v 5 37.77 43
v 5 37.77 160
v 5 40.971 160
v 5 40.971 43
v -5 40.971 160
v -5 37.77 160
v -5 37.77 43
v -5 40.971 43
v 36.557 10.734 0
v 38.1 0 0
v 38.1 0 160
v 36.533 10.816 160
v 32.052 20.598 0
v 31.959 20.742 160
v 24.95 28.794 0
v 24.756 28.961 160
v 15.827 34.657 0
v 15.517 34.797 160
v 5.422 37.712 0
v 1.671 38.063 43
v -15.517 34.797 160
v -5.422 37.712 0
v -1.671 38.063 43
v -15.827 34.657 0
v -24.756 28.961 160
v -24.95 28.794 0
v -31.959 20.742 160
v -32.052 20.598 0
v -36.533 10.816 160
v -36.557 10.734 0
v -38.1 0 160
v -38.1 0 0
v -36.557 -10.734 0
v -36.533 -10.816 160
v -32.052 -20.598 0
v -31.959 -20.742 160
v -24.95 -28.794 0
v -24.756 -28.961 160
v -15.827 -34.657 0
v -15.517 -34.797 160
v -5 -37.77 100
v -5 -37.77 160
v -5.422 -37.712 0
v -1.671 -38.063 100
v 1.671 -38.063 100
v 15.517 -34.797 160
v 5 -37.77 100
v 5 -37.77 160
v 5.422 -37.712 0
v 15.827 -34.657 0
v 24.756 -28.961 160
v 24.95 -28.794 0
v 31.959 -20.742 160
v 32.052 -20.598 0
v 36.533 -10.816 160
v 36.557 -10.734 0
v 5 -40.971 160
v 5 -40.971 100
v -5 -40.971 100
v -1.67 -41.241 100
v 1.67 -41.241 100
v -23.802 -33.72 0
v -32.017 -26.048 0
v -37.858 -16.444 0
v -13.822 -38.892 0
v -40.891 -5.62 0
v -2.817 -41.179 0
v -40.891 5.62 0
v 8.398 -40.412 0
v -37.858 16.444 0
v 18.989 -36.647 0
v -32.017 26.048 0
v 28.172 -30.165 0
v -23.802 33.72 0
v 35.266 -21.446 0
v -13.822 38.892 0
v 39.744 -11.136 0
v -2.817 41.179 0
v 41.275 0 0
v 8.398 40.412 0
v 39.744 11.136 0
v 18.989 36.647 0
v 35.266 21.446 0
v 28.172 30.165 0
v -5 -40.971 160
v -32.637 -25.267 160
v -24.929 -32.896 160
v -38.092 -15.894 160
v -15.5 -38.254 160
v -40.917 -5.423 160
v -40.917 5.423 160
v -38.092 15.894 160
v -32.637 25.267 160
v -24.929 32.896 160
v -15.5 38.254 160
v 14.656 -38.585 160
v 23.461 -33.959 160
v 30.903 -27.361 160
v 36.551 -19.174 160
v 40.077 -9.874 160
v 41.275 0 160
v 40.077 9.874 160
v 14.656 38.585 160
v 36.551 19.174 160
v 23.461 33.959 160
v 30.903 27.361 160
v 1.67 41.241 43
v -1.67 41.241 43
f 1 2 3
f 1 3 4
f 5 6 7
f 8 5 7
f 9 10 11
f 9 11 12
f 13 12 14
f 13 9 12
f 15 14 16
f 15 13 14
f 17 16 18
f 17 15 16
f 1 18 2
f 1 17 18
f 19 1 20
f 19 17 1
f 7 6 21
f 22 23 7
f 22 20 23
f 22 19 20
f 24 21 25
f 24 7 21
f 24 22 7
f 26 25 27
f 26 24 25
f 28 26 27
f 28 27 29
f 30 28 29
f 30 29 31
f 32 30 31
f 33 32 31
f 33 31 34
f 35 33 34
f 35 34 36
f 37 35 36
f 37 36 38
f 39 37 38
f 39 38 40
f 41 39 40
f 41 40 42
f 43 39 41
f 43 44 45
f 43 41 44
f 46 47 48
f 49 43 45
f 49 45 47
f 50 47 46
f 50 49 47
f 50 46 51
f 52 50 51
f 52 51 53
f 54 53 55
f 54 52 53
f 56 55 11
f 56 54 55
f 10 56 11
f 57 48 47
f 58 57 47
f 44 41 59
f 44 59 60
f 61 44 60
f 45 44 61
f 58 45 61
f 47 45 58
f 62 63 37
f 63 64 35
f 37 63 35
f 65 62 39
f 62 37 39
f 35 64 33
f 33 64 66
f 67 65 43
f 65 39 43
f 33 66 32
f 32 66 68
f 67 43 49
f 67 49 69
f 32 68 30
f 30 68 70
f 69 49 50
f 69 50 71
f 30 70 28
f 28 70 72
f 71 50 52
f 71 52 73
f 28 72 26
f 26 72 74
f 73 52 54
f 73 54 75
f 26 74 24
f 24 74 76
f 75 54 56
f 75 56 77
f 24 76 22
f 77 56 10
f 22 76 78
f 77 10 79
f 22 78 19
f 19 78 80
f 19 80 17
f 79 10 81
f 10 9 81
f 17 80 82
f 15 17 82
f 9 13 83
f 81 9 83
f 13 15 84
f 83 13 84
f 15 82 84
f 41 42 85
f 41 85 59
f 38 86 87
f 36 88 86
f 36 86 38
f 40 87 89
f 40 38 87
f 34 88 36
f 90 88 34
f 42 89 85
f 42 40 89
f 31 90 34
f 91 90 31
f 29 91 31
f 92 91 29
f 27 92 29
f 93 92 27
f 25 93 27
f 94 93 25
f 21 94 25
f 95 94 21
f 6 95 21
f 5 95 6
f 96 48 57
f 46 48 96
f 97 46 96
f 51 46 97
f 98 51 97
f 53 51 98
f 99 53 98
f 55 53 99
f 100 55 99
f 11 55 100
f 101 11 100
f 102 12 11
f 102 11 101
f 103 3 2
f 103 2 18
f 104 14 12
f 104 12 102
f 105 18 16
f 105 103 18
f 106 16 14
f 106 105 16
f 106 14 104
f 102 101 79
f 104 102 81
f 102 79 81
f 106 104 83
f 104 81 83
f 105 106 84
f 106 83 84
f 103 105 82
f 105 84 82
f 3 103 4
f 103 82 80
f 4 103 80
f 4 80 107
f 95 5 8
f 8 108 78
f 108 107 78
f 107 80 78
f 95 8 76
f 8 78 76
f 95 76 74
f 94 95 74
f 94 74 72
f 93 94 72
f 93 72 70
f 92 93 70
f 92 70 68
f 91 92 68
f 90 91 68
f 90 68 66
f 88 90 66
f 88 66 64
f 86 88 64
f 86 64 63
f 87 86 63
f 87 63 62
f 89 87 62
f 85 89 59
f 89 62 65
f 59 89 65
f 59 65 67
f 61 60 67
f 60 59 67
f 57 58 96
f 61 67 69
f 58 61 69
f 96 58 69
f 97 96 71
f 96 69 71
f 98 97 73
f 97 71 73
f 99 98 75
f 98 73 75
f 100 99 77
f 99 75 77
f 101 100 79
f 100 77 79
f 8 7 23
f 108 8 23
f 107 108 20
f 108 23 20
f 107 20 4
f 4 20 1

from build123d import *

# Parameters (mm, degrees)
SKETCH1_R           = 41.275
SKETCH1_R_2         = 38.1
BOSS_EXTRUDE1_DEPTH = 160
SKETCH2_W           = 10
SKETCH2_H           = 60
CUT_EXTRUDE1_DEPTH  = 50
SKETCH3_W           = 10
SKETCH3_H           = 117
CUT_EXTRUDE2_DEPTH  = 50


with BuildPart() as part:
    # Sketch1 → Boss-Extrude1 (new body)
    with BuildSketch(Plane.XY):
        Circle(SKETCH1_R)
        Circle(SKETCH1_R_2, mode=Mode.SUBTRACT)
    extrude(amount=BOSS_EXTRUDE1_DEPTH)

    # Sketch2 → Cut-Extrude1 (cut)
    with BuildSketch(Plane(origin=(0, 0, 0), x_dir=(1, 0, 0), z_dir=(0, 1, 0))):
        with Locations((0, -130)):
            Rectangle(SKETCH2_W, SKETCH2_H)
    extrude(amount=-CUT_EXTRUDE1_DEPTH, mode=Mode.SUBTRACT)

    # Sketch3 → Cut-Extrude2 (cut)
    with BuildSketch(Plane(origin=(0, 0, 0), x_dir=(1, 0, 0), z_dir=(0, 1, 0))):
        with Locations((0, -101.5)):
            Rectangle(SKETCH3_W, SKETCH3_H)
    extrude(amount=CUT_EXTRUDE2_DEPTH, mode=Mode.SUBTRACT)


solid = part.part
